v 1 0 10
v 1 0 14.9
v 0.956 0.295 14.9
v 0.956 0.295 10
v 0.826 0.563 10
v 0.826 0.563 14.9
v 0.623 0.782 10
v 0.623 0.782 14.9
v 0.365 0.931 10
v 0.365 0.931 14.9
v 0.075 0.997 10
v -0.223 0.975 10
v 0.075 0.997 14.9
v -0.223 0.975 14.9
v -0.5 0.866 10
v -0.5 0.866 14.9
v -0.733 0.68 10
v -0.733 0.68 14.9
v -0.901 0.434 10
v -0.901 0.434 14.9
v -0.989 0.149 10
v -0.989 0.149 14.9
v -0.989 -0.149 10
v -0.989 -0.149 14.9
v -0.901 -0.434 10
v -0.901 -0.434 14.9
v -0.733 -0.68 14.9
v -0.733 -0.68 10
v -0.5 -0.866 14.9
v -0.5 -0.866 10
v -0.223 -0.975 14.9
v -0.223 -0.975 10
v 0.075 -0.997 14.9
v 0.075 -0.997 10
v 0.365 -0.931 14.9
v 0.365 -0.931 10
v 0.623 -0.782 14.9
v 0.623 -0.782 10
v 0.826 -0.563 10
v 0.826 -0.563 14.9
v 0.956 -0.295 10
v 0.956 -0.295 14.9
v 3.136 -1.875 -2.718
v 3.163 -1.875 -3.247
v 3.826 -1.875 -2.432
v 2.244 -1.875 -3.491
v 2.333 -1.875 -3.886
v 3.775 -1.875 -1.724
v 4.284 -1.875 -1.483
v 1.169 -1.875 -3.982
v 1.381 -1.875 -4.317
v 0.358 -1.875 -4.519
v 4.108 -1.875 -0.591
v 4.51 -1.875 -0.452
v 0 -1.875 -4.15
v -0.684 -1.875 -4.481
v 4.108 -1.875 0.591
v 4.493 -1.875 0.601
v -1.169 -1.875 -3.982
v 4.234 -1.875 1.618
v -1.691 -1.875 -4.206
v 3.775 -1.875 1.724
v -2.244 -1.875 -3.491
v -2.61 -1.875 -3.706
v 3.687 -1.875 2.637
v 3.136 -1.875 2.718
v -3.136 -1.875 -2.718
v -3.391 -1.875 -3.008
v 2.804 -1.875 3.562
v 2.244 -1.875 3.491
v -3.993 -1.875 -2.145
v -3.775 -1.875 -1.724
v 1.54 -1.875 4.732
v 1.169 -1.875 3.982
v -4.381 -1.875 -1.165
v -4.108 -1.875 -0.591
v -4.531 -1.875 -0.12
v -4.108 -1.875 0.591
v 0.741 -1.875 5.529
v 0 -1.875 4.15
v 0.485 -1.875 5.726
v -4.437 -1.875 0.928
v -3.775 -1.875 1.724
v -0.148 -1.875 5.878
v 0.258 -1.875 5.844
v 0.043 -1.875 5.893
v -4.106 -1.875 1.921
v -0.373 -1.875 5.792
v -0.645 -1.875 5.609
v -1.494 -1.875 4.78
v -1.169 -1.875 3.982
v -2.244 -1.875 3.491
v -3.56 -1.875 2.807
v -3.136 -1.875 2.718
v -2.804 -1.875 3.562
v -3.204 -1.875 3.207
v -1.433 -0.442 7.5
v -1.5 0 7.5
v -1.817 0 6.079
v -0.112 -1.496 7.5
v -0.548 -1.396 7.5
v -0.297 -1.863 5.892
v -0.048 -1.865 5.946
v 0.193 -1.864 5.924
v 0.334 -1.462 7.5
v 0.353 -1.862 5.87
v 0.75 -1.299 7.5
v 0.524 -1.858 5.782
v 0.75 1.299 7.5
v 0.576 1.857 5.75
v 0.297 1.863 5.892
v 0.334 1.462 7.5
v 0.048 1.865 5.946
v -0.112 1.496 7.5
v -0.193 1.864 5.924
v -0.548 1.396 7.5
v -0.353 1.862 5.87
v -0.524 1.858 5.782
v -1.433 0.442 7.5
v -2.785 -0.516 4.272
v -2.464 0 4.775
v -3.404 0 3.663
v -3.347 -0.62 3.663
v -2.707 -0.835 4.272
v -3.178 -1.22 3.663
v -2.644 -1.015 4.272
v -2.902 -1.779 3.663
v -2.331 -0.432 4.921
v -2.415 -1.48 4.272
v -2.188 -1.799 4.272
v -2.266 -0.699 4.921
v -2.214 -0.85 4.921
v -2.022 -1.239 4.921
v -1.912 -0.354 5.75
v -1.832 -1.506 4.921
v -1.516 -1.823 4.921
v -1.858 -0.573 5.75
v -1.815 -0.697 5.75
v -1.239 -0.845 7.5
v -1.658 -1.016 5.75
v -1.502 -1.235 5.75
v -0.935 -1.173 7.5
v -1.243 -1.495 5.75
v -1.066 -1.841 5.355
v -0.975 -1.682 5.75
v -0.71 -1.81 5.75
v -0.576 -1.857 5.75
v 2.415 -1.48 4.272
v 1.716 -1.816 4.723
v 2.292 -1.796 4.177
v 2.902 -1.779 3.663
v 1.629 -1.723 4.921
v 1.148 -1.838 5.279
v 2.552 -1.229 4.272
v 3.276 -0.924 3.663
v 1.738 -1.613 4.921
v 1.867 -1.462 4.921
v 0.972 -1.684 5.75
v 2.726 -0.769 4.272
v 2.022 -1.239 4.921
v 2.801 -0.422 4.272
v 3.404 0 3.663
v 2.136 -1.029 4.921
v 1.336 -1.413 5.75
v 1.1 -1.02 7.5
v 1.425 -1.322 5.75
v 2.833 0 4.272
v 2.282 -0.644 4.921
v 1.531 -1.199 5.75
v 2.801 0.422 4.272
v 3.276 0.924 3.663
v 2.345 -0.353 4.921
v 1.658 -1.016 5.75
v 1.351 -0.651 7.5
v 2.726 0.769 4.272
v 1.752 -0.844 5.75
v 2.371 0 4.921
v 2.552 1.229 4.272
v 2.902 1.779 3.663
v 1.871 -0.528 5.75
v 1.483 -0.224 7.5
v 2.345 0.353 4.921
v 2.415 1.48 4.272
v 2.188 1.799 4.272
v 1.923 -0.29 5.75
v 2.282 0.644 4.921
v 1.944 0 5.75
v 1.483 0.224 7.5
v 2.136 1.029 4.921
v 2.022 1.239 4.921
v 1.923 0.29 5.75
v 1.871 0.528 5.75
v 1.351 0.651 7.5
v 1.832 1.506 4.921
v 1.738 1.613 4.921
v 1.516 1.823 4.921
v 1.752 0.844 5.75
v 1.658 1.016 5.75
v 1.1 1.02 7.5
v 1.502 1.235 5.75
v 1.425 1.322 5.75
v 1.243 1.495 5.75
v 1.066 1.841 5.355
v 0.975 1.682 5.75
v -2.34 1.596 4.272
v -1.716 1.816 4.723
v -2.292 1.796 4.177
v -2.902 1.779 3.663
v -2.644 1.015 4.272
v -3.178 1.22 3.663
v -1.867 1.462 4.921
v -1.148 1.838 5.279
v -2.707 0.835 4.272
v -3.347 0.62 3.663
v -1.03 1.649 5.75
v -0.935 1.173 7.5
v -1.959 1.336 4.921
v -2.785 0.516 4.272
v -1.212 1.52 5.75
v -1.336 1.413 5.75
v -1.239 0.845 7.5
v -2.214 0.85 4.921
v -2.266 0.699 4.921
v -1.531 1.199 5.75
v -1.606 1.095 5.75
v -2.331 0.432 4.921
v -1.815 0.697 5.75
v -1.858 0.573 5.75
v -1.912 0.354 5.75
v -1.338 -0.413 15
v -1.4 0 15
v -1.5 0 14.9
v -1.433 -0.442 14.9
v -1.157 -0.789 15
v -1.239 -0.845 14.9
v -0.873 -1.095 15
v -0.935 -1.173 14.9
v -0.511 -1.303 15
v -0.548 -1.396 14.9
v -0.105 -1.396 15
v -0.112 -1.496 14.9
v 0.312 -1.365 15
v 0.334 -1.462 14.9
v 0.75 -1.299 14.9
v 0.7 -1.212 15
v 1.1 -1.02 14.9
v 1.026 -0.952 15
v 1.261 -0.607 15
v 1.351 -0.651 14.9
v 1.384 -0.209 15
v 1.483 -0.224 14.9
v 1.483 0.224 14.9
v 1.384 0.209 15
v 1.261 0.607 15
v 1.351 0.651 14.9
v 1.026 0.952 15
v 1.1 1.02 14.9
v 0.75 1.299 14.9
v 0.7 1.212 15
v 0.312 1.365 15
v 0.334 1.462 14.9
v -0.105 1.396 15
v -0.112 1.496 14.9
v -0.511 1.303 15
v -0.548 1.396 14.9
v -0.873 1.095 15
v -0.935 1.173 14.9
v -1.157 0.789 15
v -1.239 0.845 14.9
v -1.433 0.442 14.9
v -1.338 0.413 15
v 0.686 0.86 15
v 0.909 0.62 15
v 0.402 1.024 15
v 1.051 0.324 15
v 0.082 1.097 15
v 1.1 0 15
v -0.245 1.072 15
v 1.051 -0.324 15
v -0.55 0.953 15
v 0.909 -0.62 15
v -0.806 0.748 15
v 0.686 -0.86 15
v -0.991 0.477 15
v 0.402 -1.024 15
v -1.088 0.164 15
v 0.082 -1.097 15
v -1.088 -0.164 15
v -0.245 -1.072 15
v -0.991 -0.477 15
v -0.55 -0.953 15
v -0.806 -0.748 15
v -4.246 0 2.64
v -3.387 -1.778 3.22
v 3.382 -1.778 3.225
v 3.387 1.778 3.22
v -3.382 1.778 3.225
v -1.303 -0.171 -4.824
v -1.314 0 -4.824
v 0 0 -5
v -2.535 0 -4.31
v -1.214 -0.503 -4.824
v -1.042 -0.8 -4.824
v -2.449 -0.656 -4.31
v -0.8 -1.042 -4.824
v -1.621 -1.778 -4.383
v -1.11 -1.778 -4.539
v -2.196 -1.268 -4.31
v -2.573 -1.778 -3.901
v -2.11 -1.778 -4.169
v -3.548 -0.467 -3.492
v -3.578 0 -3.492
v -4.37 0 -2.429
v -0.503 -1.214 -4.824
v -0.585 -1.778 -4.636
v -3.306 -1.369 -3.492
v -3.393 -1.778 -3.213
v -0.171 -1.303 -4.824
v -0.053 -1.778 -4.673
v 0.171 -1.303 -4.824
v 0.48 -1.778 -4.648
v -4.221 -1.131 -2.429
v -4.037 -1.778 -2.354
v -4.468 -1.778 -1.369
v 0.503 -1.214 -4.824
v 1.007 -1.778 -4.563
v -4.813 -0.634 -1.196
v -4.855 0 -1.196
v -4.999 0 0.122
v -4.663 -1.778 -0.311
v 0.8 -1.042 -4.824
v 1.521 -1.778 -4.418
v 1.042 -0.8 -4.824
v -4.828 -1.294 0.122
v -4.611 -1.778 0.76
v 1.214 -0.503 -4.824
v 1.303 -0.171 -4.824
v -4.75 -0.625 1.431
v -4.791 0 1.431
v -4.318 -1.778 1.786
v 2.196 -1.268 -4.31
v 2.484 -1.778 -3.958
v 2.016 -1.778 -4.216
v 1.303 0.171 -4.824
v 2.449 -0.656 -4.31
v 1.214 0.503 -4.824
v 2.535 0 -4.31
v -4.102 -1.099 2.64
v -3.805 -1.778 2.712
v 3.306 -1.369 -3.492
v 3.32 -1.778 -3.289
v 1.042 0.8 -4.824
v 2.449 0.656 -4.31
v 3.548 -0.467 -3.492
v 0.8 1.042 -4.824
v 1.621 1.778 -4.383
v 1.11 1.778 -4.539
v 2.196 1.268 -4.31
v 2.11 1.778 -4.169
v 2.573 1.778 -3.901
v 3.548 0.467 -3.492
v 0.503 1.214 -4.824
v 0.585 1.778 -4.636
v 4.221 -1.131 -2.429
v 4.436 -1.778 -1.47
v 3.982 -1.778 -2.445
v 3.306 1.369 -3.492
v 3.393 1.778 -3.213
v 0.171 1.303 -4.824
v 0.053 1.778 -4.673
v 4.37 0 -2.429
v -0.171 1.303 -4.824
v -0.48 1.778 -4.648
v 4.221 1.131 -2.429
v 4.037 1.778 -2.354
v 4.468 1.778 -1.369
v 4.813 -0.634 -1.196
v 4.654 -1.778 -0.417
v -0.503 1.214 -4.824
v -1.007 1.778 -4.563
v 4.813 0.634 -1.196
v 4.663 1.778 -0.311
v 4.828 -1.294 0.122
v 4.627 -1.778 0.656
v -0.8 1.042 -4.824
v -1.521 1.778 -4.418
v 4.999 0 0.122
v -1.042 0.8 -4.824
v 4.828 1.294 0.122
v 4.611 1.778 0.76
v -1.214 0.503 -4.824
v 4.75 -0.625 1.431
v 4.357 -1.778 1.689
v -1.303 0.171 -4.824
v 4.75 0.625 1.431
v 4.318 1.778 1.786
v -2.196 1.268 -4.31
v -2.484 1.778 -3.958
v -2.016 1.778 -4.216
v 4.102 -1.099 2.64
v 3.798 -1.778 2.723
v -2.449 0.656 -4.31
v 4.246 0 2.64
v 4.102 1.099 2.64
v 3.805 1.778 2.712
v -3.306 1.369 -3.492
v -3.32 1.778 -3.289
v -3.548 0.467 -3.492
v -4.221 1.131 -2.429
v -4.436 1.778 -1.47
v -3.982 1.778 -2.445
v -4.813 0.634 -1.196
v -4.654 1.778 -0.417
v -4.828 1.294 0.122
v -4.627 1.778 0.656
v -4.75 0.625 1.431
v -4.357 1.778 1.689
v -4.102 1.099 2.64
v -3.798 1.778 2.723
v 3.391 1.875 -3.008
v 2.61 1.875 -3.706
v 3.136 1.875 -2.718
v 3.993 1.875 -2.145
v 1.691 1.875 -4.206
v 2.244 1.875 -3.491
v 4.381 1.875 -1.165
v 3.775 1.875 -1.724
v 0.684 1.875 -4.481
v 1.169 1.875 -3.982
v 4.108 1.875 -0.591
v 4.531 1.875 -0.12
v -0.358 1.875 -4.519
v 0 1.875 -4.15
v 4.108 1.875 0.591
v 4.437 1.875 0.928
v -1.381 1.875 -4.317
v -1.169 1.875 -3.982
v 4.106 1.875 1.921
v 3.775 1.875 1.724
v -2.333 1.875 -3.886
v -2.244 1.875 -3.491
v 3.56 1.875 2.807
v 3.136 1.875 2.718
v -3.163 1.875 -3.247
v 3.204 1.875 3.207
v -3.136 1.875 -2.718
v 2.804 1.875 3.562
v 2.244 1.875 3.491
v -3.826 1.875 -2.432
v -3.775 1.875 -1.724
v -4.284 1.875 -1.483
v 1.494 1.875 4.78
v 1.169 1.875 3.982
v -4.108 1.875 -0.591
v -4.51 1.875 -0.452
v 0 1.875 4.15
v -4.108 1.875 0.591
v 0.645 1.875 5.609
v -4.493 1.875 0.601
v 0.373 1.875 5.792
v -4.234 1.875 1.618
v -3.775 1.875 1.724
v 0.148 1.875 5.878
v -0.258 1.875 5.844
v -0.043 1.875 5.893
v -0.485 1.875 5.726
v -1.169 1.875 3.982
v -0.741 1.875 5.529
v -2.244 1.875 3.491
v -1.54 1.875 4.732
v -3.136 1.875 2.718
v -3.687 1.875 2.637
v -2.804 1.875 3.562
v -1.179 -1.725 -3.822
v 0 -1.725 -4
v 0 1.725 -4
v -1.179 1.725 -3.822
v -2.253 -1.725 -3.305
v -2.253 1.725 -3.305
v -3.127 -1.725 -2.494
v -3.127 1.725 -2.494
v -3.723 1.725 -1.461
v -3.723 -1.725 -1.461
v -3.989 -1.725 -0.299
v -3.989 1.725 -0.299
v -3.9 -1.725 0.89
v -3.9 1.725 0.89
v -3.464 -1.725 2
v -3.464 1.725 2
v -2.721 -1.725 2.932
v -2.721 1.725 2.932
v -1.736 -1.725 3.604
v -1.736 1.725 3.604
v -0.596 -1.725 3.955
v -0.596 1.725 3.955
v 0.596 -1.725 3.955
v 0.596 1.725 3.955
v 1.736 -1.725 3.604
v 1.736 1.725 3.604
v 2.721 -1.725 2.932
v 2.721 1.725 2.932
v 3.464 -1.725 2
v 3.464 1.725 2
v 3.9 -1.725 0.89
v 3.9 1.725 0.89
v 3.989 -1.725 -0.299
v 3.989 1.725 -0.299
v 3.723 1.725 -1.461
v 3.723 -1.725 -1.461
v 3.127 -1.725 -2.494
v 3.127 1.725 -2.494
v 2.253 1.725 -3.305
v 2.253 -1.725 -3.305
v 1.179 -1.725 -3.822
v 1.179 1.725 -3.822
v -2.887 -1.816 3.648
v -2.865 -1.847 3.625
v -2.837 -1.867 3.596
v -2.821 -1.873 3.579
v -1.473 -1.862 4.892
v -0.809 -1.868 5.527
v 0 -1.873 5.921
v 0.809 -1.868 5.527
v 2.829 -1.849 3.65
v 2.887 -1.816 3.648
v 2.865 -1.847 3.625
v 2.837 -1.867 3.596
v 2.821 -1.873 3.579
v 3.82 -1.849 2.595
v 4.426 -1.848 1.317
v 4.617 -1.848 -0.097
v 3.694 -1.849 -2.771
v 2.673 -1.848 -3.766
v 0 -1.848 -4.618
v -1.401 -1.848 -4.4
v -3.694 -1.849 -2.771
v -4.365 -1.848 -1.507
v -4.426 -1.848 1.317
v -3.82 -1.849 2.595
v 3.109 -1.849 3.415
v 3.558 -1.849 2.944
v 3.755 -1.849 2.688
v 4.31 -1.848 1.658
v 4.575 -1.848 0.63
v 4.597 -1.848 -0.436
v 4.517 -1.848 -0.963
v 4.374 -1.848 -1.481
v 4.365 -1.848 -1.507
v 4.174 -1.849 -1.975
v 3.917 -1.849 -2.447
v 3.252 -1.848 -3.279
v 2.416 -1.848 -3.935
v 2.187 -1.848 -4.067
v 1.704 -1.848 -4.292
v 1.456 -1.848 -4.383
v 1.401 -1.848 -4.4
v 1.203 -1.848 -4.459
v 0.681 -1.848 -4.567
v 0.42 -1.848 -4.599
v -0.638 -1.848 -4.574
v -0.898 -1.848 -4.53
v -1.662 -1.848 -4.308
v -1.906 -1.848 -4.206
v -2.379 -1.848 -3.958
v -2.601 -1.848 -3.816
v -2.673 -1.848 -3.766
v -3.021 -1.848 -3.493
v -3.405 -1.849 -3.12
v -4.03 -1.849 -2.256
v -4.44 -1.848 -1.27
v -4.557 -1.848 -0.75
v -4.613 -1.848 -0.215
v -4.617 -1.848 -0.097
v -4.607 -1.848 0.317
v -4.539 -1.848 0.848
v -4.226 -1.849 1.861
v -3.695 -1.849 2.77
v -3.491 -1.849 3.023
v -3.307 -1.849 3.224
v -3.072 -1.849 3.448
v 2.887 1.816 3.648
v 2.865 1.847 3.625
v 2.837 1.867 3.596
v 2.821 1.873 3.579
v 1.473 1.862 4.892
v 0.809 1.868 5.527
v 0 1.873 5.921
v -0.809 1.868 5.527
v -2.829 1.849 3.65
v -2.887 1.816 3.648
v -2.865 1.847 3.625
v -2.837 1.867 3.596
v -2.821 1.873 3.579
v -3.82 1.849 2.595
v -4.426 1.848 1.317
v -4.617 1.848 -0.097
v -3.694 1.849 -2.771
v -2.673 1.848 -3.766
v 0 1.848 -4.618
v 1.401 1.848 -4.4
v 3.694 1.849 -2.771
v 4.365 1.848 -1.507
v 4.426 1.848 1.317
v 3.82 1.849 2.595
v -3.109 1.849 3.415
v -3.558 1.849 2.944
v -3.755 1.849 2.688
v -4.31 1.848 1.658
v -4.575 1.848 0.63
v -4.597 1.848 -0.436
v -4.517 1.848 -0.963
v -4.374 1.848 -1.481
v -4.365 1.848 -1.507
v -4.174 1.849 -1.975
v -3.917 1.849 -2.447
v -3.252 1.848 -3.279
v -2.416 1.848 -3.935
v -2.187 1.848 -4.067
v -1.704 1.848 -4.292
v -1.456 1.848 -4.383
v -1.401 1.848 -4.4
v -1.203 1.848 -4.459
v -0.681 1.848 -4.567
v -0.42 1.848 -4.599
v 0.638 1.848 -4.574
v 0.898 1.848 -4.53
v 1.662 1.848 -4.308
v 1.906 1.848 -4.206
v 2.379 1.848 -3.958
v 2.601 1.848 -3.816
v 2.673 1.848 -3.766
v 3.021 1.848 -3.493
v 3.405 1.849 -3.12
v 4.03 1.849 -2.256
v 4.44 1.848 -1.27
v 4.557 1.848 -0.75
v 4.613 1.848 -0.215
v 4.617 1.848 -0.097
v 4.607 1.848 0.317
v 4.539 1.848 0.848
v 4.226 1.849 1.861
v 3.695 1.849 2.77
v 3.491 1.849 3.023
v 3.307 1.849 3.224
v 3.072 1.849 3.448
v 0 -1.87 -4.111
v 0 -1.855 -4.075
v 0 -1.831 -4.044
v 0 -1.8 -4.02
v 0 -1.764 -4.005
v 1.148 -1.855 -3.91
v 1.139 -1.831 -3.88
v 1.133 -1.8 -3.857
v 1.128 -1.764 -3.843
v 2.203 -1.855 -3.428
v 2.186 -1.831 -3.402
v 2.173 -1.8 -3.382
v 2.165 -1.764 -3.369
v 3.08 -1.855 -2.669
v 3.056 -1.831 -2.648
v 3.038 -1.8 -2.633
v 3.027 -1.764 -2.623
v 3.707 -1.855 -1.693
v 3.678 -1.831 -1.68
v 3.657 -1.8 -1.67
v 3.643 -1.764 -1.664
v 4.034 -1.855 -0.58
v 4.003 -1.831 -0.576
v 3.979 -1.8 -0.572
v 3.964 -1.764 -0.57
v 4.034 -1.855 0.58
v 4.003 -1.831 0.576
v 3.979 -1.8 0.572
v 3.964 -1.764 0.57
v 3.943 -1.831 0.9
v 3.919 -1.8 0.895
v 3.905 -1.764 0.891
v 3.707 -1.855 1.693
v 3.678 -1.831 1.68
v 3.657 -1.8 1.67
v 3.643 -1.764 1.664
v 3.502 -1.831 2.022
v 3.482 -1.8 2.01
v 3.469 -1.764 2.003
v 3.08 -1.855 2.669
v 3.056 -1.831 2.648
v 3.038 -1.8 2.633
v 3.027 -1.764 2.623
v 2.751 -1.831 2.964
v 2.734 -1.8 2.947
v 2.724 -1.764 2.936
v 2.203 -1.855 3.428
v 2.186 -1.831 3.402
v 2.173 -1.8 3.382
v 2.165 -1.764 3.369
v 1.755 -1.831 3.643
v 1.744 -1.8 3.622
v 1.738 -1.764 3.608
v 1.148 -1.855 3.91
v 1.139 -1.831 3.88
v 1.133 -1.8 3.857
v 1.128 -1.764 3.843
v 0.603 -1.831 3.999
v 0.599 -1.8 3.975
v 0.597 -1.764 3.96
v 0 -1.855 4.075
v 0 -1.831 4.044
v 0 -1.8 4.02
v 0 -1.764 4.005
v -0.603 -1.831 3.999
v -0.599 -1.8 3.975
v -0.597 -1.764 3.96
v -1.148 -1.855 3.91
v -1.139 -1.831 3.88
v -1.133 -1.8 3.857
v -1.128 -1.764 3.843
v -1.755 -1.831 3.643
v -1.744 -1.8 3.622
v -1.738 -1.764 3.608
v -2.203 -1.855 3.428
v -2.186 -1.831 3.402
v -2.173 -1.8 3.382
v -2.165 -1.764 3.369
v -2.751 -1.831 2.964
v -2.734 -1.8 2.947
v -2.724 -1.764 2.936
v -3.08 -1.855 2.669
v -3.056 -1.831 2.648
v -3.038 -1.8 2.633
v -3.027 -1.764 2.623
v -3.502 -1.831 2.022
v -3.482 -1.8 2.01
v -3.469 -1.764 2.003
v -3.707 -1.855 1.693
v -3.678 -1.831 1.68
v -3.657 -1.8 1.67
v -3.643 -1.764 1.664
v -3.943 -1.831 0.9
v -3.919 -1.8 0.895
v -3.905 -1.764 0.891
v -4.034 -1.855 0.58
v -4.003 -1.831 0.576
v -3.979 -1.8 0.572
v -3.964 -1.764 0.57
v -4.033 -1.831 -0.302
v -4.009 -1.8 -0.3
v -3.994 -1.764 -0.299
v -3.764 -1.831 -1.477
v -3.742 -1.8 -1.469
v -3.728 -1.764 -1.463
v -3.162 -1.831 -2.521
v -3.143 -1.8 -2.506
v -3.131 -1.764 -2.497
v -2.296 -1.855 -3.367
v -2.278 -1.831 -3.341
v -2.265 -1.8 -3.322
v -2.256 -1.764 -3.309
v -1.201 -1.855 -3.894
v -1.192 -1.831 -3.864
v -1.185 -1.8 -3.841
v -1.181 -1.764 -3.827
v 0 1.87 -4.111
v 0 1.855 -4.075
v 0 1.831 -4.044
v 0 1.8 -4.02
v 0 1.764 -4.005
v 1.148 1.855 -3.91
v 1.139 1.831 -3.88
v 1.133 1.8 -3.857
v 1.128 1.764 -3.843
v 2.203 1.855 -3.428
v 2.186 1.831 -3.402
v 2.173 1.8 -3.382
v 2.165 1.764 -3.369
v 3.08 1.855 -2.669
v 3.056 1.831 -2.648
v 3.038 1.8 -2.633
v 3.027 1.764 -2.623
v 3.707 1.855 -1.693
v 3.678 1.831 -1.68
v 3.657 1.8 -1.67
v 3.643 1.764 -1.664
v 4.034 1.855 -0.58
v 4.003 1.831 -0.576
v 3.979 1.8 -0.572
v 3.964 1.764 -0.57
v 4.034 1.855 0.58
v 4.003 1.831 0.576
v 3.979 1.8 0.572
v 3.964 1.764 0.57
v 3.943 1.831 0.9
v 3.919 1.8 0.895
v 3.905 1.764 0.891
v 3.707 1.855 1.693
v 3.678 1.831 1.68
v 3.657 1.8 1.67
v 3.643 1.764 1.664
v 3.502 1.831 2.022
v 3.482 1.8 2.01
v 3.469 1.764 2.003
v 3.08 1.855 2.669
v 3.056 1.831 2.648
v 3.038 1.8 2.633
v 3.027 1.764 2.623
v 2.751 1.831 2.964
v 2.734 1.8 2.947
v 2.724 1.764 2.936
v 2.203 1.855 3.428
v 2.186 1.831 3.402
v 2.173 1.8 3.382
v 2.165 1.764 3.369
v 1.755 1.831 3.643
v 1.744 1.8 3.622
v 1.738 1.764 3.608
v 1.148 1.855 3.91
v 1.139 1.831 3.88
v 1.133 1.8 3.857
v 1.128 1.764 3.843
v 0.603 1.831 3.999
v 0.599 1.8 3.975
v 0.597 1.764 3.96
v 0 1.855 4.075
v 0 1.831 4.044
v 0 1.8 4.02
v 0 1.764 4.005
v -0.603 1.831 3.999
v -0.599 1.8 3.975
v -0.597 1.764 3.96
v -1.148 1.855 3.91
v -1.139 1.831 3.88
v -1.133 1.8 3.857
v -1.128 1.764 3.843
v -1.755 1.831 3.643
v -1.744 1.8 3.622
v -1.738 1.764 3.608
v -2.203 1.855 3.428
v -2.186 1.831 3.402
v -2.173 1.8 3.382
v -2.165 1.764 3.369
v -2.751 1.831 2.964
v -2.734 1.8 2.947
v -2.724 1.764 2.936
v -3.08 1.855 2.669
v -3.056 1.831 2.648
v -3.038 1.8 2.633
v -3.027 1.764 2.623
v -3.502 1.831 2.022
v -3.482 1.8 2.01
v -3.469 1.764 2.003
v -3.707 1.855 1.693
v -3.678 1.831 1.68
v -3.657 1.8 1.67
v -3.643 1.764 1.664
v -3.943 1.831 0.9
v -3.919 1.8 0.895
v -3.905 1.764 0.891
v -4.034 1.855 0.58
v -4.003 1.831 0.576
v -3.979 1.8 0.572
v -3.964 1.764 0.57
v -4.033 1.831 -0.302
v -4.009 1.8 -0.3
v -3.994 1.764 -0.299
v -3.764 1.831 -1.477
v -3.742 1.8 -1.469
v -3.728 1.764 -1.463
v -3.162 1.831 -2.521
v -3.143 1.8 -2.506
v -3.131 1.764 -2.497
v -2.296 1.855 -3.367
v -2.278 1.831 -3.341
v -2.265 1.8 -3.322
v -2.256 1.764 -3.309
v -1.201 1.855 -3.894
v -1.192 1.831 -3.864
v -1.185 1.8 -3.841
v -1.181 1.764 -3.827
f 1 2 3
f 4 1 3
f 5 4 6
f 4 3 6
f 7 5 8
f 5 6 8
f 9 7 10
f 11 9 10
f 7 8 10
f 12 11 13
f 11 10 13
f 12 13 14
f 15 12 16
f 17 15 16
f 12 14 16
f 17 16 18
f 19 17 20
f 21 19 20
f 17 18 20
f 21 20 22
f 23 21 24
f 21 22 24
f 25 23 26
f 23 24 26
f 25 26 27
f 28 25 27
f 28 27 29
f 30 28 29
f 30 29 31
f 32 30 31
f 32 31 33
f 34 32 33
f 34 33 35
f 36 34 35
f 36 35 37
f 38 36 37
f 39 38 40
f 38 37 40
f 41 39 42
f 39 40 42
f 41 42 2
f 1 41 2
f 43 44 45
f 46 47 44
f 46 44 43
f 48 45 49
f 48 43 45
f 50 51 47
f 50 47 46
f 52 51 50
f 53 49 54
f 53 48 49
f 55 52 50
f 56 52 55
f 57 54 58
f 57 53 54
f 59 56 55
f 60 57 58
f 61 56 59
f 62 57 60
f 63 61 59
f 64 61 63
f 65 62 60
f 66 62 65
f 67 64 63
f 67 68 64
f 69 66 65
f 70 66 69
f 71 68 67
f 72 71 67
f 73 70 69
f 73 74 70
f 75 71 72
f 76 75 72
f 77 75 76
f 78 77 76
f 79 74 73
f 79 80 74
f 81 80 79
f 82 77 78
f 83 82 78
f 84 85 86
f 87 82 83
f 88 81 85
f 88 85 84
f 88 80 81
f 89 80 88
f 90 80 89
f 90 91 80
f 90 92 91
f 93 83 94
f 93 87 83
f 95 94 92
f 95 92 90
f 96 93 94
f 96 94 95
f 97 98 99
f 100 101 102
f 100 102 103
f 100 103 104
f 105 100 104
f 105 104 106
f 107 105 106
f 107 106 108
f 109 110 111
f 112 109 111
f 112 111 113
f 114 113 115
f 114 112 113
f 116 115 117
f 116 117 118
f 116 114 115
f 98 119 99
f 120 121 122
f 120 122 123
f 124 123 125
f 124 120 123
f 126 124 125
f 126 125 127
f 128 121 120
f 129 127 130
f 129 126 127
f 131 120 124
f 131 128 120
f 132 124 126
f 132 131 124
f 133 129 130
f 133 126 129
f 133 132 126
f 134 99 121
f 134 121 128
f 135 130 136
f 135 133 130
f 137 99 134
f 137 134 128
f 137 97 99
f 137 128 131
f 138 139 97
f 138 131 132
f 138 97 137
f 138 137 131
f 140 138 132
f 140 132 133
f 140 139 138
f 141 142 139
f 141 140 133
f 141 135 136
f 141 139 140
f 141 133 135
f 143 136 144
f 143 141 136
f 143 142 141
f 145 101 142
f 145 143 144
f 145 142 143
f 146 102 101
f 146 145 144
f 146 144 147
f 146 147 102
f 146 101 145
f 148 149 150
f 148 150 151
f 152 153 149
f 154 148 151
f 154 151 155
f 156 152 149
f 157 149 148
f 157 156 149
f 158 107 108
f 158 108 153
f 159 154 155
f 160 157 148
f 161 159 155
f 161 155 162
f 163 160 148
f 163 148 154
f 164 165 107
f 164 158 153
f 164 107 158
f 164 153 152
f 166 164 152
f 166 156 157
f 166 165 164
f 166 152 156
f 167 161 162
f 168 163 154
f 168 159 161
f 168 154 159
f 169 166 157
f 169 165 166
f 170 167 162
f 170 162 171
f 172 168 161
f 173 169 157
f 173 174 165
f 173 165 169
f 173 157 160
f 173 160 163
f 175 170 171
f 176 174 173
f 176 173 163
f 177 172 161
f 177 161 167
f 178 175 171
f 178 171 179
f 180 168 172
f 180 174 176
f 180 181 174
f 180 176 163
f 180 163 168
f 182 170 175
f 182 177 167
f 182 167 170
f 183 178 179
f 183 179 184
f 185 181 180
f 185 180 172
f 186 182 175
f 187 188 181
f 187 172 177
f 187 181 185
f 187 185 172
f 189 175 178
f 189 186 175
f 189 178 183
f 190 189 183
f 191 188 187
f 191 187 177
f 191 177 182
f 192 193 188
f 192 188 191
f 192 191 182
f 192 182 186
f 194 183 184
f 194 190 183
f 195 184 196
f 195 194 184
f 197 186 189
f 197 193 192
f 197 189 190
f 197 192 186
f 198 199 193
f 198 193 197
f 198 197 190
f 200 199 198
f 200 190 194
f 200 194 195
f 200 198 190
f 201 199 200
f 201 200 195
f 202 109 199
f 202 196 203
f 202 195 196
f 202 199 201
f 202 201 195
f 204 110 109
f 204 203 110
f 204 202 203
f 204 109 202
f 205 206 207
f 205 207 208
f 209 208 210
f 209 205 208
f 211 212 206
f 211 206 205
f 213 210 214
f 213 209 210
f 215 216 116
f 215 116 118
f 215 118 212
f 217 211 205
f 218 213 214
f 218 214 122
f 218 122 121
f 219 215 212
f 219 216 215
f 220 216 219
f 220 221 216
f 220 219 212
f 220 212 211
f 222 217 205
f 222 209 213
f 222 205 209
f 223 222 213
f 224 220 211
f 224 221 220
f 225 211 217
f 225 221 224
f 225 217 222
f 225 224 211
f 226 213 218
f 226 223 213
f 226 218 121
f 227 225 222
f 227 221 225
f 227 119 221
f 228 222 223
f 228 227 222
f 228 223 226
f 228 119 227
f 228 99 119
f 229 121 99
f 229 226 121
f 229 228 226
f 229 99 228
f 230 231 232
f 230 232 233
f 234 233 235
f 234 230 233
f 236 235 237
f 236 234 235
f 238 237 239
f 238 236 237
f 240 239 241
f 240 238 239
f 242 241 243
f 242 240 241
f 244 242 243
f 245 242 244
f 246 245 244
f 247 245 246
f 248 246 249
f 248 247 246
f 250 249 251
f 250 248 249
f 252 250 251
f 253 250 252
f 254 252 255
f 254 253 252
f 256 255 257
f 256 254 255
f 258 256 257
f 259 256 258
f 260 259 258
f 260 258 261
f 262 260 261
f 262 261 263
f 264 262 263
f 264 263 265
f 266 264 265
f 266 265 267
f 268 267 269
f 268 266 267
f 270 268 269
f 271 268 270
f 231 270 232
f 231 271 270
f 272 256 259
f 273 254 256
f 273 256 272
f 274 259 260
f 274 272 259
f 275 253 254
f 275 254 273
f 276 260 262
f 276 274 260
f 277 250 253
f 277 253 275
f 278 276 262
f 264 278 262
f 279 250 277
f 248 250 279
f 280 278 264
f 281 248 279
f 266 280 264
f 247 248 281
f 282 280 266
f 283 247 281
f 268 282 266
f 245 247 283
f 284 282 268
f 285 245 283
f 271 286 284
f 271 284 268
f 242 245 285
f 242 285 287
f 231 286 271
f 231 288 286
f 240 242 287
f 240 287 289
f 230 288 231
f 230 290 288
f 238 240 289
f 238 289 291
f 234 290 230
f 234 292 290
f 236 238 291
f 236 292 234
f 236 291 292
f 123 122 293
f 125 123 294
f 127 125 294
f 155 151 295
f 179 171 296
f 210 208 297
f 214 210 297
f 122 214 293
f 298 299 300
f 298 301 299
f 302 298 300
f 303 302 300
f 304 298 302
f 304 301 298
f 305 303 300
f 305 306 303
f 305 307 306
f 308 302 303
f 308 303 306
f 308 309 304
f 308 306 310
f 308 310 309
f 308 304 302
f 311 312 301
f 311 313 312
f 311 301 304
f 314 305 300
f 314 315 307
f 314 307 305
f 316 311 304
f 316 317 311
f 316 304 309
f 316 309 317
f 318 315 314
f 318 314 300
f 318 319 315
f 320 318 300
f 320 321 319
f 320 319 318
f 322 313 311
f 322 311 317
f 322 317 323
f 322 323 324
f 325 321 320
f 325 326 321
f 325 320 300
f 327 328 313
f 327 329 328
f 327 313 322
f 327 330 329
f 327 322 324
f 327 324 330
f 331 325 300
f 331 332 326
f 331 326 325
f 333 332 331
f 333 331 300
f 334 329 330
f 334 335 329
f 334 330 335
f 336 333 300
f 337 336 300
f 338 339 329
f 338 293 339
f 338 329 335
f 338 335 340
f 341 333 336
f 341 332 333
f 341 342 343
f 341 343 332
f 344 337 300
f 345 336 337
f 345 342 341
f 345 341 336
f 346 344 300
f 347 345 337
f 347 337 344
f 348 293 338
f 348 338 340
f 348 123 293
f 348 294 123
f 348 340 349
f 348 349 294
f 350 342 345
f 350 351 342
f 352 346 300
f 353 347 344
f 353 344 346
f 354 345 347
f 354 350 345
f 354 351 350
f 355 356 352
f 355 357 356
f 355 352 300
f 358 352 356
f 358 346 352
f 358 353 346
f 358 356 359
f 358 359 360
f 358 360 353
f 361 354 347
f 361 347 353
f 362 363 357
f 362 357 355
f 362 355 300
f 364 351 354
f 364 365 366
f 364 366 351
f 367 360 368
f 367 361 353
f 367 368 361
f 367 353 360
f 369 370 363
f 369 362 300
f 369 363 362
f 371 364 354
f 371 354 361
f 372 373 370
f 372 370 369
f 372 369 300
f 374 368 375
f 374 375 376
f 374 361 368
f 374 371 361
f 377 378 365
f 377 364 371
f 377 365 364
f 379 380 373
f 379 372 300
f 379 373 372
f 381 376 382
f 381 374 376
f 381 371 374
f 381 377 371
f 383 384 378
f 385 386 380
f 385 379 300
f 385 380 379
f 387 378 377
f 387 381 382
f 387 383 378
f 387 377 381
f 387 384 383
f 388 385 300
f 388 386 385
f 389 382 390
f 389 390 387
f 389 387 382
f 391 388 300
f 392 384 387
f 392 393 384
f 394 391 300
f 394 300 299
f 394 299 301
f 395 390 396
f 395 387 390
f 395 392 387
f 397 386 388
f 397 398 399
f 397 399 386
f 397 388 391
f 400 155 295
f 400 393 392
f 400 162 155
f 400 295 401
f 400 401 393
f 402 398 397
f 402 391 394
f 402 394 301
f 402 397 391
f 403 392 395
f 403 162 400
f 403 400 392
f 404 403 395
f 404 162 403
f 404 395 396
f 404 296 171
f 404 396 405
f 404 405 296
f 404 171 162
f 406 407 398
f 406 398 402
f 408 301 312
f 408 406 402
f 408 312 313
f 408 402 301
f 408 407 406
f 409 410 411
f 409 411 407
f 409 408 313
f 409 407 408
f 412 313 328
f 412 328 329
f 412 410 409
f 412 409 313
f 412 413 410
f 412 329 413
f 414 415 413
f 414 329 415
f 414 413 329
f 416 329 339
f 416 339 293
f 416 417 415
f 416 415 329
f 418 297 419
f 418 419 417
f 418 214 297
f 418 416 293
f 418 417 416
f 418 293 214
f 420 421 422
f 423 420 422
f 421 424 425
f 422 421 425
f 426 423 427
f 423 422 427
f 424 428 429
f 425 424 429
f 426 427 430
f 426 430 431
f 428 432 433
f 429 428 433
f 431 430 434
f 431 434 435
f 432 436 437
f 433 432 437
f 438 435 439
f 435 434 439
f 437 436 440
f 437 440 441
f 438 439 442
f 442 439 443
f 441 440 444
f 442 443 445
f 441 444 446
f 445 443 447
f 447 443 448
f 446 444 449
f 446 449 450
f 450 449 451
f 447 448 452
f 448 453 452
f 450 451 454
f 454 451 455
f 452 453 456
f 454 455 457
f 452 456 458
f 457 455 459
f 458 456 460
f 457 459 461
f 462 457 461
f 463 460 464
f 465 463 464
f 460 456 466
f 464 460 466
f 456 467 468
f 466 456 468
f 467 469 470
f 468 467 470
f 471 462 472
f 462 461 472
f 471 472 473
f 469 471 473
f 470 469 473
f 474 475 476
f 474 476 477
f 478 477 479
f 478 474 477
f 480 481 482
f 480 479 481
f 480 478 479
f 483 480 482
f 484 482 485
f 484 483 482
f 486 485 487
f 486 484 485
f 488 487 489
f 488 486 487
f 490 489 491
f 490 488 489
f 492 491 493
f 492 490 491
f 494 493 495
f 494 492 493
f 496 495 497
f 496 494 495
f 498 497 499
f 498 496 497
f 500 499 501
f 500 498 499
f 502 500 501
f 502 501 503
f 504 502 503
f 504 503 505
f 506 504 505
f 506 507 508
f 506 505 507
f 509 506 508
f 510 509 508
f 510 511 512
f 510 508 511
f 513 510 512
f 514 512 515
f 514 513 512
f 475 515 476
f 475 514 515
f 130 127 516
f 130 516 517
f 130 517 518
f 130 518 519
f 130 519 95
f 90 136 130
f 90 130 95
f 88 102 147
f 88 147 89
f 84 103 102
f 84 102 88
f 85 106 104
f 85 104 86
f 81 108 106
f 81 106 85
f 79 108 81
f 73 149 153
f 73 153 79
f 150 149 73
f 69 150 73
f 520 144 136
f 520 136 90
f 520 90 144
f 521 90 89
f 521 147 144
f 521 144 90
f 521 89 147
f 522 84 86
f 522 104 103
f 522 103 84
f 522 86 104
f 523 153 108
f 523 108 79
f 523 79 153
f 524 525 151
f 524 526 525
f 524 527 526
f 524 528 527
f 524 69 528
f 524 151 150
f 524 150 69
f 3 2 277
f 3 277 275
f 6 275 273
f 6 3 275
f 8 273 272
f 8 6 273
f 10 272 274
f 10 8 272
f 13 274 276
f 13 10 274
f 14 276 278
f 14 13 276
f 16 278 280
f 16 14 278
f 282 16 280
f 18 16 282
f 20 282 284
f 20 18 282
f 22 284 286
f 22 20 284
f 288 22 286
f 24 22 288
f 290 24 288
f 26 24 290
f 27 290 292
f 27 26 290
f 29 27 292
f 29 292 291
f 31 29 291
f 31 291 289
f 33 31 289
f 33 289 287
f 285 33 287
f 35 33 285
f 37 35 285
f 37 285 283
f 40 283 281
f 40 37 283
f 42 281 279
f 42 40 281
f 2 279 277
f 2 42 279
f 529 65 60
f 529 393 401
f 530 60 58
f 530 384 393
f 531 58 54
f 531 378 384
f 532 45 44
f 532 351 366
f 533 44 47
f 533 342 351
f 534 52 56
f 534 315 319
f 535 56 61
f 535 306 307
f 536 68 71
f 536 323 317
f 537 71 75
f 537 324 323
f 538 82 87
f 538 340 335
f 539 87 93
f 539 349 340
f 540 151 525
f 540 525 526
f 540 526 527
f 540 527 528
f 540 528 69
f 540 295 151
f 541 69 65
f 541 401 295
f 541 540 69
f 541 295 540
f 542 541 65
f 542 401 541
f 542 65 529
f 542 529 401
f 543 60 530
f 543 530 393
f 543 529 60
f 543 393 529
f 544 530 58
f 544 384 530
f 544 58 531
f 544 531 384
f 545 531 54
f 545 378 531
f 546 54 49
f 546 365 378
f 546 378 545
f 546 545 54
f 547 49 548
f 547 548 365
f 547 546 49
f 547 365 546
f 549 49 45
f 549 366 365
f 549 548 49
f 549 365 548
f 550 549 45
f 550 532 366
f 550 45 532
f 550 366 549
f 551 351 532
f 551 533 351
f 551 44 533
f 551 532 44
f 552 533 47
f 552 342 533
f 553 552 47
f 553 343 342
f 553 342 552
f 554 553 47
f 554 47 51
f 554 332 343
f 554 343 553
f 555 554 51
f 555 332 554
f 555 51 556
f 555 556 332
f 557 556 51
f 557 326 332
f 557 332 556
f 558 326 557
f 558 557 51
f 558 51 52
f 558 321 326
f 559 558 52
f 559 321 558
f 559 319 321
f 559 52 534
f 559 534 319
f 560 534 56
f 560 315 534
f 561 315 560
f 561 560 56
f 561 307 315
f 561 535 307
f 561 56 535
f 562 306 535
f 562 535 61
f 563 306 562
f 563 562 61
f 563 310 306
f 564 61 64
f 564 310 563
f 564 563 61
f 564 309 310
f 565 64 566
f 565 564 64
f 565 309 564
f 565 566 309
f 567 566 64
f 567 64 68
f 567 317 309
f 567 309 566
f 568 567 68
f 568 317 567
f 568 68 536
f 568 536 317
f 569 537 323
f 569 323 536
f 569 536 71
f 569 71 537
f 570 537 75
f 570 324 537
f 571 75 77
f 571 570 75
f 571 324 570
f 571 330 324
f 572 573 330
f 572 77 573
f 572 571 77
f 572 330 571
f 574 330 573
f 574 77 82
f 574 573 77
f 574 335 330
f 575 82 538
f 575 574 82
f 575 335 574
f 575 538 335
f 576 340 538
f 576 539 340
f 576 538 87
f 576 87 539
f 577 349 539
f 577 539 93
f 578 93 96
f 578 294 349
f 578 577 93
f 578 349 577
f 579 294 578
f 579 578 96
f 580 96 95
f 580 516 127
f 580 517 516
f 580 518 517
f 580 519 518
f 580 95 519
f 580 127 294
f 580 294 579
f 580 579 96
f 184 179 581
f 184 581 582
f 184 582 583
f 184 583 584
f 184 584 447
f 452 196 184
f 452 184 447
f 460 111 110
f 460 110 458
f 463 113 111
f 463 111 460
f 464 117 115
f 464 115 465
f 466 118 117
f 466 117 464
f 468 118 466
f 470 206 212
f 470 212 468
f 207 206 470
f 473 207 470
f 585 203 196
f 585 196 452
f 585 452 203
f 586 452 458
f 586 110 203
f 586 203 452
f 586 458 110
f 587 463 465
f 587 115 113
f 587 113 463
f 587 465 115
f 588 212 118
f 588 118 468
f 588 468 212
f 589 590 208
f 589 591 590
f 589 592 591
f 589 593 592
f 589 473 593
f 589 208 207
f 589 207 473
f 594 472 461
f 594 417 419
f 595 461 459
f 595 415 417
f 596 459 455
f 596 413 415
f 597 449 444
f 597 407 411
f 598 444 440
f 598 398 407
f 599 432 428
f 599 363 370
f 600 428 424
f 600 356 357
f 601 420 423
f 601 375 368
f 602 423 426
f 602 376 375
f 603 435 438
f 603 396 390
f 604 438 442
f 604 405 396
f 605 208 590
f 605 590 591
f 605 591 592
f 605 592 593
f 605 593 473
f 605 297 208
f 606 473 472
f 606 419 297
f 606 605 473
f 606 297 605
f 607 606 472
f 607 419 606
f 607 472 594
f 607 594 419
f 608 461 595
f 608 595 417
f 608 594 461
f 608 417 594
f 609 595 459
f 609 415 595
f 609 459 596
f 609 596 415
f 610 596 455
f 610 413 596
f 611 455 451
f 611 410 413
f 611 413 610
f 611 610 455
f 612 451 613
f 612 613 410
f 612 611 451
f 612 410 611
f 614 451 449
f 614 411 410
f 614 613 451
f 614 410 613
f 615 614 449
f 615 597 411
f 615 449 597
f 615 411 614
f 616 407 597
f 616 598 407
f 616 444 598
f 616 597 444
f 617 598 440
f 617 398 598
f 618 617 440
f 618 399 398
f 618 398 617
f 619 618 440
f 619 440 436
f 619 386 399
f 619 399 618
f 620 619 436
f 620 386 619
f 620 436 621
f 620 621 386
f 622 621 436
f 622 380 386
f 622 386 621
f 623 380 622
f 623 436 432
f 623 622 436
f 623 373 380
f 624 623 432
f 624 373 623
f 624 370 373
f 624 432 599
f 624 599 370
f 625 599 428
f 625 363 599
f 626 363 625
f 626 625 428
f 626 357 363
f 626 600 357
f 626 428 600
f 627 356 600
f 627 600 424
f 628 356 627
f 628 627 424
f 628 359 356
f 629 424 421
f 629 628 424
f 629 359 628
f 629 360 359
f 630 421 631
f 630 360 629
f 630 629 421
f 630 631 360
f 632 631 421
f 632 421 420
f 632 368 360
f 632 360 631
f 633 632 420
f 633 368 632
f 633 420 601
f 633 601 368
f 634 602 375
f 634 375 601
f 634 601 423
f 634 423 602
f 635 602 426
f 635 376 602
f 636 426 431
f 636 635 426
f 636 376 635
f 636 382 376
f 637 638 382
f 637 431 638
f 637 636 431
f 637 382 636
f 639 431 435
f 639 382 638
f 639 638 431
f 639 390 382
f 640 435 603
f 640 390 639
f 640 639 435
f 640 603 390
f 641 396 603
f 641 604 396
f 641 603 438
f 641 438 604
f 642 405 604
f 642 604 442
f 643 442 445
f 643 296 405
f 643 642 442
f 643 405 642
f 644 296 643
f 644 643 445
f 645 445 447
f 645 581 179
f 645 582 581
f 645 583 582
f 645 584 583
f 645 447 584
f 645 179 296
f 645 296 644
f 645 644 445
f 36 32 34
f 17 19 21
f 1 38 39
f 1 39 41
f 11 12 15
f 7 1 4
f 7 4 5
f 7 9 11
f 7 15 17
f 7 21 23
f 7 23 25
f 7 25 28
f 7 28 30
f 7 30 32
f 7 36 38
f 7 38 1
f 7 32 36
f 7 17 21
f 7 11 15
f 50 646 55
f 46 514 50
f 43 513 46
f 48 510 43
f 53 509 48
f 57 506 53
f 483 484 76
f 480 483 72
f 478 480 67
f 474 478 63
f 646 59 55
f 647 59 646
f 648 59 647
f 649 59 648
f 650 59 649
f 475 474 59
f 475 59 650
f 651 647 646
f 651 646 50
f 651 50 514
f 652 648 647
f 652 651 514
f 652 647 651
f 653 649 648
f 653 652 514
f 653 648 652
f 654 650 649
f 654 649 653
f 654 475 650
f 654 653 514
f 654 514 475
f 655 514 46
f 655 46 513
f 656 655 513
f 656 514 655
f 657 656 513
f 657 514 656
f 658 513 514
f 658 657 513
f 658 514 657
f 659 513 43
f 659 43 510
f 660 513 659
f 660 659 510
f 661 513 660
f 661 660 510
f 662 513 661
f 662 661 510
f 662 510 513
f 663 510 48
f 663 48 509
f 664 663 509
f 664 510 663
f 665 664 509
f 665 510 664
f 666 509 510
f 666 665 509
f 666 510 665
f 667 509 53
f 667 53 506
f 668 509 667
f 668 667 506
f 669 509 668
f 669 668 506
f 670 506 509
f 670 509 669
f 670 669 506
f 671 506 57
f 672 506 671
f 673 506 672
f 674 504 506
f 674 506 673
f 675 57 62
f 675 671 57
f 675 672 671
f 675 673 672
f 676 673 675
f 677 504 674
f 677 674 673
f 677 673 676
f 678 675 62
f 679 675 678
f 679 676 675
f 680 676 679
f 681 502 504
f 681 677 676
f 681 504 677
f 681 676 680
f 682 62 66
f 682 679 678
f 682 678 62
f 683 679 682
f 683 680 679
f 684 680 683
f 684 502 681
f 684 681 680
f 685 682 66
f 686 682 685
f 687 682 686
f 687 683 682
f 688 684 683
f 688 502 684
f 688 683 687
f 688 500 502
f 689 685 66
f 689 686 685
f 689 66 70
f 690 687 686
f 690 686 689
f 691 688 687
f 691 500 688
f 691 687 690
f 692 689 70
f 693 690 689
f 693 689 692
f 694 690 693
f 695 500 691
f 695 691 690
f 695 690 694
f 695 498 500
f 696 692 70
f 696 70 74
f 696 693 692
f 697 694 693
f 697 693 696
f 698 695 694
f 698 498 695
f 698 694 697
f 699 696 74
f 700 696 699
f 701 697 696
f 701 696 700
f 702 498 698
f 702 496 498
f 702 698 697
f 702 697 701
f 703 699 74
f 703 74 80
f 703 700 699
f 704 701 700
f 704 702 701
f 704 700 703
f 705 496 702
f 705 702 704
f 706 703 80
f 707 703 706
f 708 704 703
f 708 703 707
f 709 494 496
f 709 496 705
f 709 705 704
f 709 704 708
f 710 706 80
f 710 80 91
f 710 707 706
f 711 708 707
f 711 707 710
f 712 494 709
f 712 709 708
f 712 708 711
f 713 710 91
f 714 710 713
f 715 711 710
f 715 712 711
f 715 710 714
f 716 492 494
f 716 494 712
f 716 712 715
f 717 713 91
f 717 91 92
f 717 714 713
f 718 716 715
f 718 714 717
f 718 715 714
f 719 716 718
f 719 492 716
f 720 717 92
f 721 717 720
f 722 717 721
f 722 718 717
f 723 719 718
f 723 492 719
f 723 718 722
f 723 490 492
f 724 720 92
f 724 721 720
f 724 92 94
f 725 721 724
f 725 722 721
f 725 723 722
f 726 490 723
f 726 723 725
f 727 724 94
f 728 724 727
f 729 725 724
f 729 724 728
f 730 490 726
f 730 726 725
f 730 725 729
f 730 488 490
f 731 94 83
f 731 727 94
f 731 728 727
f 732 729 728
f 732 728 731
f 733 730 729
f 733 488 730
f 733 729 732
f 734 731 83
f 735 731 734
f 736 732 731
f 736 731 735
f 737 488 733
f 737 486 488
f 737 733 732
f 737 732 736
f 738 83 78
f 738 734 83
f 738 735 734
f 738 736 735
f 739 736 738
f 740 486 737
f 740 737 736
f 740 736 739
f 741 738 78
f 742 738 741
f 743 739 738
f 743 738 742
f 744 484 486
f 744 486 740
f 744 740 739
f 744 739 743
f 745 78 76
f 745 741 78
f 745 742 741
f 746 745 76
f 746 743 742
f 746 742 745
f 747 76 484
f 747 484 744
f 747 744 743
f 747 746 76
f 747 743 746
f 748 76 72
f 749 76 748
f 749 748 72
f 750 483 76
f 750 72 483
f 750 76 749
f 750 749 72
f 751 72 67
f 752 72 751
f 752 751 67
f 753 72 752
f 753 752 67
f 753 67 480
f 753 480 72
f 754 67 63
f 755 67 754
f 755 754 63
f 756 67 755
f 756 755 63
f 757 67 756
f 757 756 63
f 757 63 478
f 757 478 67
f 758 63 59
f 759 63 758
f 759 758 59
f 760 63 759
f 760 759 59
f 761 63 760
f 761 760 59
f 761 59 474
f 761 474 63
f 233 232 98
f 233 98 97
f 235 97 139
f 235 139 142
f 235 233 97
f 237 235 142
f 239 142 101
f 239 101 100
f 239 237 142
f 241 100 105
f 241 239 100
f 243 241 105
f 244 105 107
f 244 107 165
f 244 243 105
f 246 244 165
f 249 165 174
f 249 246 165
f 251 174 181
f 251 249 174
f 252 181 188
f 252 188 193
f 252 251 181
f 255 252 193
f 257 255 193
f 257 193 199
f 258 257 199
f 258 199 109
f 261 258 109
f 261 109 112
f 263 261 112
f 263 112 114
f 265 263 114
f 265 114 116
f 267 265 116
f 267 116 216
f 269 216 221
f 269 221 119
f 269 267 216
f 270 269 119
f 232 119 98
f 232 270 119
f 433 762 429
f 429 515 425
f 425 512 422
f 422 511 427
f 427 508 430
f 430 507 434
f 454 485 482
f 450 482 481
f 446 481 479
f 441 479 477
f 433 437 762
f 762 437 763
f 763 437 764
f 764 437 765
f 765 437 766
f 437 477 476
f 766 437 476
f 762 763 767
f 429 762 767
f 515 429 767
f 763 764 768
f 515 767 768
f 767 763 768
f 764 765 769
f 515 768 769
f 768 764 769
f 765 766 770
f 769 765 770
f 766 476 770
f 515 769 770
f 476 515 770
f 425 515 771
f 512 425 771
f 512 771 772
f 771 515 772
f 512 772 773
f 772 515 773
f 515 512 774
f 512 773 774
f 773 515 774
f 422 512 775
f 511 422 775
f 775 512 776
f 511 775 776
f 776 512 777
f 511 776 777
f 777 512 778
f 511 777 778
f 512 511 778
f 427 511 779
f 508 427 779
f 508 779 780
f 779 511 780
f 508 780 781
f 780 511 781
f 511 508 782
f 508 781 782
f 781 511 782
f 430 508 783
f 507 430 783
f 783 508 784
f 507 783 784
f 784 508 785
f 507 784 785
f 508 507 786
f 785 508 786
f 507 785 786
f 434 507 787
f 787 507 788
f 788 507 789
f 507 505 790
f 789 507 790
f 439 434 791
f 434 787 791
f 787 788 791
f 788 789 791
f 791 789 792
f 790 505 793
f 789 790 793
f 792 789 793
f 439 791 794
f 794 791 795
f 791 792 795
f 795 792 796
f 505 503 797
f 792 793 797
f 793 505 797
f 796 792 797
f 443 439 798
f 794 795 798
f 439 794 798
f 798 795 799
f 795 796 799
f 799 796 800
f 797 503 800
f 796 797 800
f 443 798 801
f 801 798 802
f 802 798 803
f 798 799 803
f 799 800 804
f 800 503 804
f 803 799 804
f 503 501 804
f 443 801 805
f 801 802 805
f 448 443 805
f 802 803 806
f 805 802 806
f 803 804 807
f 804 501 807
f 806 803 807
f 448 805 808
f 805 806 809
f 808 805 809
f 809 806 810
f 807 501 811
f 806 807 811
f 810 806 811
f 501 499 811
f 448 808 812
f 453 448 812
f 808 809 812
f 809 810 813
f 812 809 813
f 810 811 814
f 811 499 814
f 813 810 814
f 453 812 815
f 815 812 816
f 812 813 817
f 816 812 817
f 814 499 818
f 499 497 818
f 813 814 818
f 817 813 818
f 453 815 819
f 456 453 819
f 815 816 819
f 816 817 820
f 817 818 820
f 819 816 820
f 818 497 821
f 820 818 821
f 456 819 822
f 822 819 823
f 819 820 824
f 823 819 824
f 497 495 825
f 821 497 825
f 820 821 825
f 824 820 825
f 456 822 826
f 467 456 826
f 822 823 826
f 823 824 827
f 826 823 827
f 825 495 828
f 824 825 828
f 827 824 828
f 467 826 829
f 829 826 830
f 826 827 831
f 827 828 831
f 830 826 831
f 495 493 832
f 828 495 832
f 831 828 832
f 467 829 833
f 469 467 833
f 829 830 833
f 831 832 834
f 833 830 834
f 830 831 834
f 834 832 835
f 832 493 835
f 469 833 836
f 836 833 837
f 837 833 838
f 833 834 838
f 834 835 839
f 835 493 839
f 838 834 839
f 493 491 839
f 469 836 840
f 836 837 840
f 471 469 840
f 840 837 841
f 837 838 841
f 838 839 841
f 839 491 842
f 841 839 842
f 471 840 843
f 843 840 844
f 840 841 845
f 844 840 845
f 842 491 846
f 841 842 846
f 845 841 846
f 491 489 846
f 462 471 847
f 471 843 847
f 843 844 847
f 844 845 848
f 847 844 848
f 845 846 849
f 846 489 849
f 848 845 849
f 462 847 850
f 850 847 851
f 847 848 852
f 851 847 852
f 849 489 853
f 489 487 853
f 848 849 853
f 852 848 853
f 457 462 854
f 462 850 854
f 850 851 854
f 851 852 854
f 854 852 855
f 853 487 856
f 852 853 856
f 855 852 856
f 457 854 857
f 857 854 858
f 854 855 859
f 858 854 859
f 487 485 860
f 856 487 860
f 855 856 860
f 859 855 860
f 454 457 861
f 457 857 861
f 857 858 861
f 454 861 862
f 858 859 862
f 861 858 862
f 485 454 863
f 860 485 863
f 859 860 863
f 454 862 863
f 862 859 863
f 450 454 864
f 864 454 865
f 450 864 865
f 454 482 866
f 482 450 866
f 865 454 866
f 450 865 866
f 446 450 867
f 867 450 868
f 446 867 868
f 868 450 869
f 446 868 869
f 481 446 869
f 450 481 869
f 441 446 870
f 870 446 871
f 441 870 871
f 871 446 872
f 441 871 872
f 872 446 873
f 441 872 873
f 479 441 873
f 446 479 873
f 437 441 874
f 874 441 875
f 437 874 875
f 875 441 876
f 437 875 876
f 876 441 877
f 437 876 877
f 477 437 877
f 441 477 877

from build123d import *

# Parameters (mm, degrees)
CUT_EXTRUDE1_DEPTH      = 10
CUT_EXTRUDE1_DEPTH_BACK = 10
CUT_EXTRUDE2_DEPTH      = 10
CUT_EXTRUDE2_DEPTH_BACK = 10
SKETCH4_R               = 4
FILLET1_R               = 0.15
SKETCH5_R               = 1
CUT_EXTRUDE3_DEPTH      = 5
CHAMFER1_SIZE           = 0.1


with BuildPart() as part:
    # Sketch2 → Revolve1 (revolve)
    with BuildSketch(Plane(origin=(0, 0, 0), x_dir=(1, 0, 0), z_dir=(0, 1, 0))):
        with BuildLine():
            Line((-1.5, -15), (0, -15))
            Line((0, -15), (0, 5))
            ThreePointArc((0, 5), (-4.653678795, 1.828462107), (-3.403630134, -3.662690529))
            ThreePointArc((-3.403630134, -3.662690529), (-2.101159156, -5.407390267), (-1.5, -7.5))
            Line((-1.5, -7.5), (-1.5, -15))
        make_face()
    revolve(axis=Axis((0, 0, -5), (0, 0, 1)))

    # Sketch3 → Cut-Extrude1 (cut, two sides: drawn at the far end of the back side and taken through both)
    with BuildSketch(Plane(origin=(0, 0, 0), x_dir=(0, 0, -1), z_dir=(1, 0, 0)).offset(-CUT_EXTRUDE1_DEPTH_BACK)):
        with BuildLine():
            Line((-28.551214251, 11.477133286), (8.27443741, 11.477133286))
            Line((8.27443741, 11.477133286), (8.27443741, 1.875))
            Line((8.27443741, 1.875), (-13.261452794, 1.875))
            ThreePointArc((-13.261452794, 1.875), (-14.764981791, 2.106415246), (-16.129334975, 2.779239779))
            Line((-16.129334975, 2.779239779), (-28.551214251, 11.477133286))
        make_face()
        with BuildLine():
            Line((-16.129334975, -2.779239779), (-28.551214251, -11.477133286))
            Line((-28.551214251, -11.477133286), (8.27443741, -11.477133286))
            Line((8.27443741, -11.477133286), (8.27443741, -1.875))
            Line((8.27443741, -1.875), (-13.261452794, -1.875))
            ThreePointArc((-13.261452794, -1.875), (-14.764981791, -2.106415246), (-16.129334975, -2.779239779))
        make_face()
    extrude(amount=CUT_EXTRUDE1_DEPTH + CUT_EXTRUDE1_DEPTH_BACK, mode=Mode.SUBTRACT)

    # Sketch4 → Cut-Extrude2 (cut, two sides: drawn at the far end of the back side and taken through both)
    with BuildSketch(Plane(origin=(0, 0, 0), x_dir=(1, 0, 0), z_dir=(0, 1, 0)).offset(-CUT_EXTRUDE2_DEPTH_BACK)):
        Circle(SKETCH4_R)
    extrude(amount=CUT_EXTRUDE2_DEPTH + CUT_EXTRUDE2_DEPTH_BACK, mode=Mode.SUBTRACT)

    # Fillet1
    fillet1_edges = [part.edges().sort_by_distance(p)[0] for p in [
        (-4, -1.875, 0),
        (0, -1.875, -4.635124054),
        (0, 1.875, -4.635124054),
        (-1e-09, -1.875, 5.921985494),
        (1e-09, 1.875, 5.921985494),
        (-4, 1.875, 0),
    ]]
    fillet(fillet1_edges, radius=FILLET1_R)

    # Sketch5 → Cut-Extrude3 (cut)
    with BuildSketch(Plane.XY.offset(15)):
        Circle(SKETCH5_R)
    extrude(amount=-CUT_EXTRUDE3_DEPTH, mode=Mode.SUBTRACT)

    # Chamfer1
    chamfer1_edges = [part.edges().sort_by_distance(p)[0] for p in [
        (1.5, 0, 15),
        (-1, 0, 15),
    ]]
    chamfer(chamfer1_edges, length=CHAMFER1_SIZE)


solid = part.part
